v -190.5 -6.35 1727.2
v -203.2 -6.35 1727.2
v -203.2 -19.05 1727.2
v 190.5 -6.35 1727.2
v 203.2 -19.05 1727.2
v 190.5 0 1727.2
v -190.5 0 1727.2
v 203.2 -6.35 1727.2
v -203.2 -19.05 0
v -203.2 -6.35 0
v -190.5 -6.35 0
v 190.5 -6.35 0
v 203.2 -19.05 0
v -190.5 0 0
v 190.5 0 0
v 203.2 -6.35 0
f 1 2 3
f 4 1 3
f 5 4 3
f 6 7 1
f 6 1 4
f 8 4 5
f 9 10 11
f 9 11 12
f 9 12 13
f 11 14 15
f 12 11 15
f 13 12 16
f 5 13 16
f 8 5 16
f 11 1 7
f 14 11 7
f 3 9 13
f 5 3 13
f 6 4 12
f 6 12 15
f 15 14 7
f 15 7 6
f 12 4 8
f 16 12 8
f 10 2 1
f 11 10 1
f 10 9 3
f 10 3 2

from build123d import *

# Parameters (mm, degrees)
F0_W       = 406.4
F0_H       = 19.05
F1_DEPTH   = 1727.2
F2_W       = 12.7
F2_H       = 6.35
F1_FACE1_W = 406.4
F1_FACE1_H = 19.05
F3_DEPTH   = 1727.201
F4_W       = 12.7
F4_H       = 6.35
F5_DEPTH   = 1727.201


with BuildPart() as f1:
    # F0 (on Top) → F1 (new body)
    with BuildSketch(Plane.XY):
        with Locations((0, -9.525)):
            Rectangle(F0_W, F0_H)
    extrude(amount=F1_DEPTH)

    # F2 (on face) + F1_face1 (on face) → F3 (cut, through all)
    with BuildSketch(Plane.XY.offset(1727.2)):
        with Locations((196.85, -3.175)):
            Rectangle(F2_W, F2_H)
    with BuildSketch(Plane(origin=(0, -9.525, 0), x_dir=(1, 0, 0), z_dir=(0, 0, -1))):
        Rectangle(F1_FACE1_W, F1_FACE1_H)
    extrude(amount=-F3_DEPTH, dir=(0, 0, 1), mode=Mode.SUBTRACT)

    # F4 (on face) → F5 (cut, through all)
    with BuildSketch(Plane.XY.offset(1727.2)):
        with Locations((-196.85, -3.175)):
            Rectangle(F4_W, F4_H)
    extrude(amount=-F5_DEPTH, mode=Mode.SUBTRACT)


solid = f1.part
